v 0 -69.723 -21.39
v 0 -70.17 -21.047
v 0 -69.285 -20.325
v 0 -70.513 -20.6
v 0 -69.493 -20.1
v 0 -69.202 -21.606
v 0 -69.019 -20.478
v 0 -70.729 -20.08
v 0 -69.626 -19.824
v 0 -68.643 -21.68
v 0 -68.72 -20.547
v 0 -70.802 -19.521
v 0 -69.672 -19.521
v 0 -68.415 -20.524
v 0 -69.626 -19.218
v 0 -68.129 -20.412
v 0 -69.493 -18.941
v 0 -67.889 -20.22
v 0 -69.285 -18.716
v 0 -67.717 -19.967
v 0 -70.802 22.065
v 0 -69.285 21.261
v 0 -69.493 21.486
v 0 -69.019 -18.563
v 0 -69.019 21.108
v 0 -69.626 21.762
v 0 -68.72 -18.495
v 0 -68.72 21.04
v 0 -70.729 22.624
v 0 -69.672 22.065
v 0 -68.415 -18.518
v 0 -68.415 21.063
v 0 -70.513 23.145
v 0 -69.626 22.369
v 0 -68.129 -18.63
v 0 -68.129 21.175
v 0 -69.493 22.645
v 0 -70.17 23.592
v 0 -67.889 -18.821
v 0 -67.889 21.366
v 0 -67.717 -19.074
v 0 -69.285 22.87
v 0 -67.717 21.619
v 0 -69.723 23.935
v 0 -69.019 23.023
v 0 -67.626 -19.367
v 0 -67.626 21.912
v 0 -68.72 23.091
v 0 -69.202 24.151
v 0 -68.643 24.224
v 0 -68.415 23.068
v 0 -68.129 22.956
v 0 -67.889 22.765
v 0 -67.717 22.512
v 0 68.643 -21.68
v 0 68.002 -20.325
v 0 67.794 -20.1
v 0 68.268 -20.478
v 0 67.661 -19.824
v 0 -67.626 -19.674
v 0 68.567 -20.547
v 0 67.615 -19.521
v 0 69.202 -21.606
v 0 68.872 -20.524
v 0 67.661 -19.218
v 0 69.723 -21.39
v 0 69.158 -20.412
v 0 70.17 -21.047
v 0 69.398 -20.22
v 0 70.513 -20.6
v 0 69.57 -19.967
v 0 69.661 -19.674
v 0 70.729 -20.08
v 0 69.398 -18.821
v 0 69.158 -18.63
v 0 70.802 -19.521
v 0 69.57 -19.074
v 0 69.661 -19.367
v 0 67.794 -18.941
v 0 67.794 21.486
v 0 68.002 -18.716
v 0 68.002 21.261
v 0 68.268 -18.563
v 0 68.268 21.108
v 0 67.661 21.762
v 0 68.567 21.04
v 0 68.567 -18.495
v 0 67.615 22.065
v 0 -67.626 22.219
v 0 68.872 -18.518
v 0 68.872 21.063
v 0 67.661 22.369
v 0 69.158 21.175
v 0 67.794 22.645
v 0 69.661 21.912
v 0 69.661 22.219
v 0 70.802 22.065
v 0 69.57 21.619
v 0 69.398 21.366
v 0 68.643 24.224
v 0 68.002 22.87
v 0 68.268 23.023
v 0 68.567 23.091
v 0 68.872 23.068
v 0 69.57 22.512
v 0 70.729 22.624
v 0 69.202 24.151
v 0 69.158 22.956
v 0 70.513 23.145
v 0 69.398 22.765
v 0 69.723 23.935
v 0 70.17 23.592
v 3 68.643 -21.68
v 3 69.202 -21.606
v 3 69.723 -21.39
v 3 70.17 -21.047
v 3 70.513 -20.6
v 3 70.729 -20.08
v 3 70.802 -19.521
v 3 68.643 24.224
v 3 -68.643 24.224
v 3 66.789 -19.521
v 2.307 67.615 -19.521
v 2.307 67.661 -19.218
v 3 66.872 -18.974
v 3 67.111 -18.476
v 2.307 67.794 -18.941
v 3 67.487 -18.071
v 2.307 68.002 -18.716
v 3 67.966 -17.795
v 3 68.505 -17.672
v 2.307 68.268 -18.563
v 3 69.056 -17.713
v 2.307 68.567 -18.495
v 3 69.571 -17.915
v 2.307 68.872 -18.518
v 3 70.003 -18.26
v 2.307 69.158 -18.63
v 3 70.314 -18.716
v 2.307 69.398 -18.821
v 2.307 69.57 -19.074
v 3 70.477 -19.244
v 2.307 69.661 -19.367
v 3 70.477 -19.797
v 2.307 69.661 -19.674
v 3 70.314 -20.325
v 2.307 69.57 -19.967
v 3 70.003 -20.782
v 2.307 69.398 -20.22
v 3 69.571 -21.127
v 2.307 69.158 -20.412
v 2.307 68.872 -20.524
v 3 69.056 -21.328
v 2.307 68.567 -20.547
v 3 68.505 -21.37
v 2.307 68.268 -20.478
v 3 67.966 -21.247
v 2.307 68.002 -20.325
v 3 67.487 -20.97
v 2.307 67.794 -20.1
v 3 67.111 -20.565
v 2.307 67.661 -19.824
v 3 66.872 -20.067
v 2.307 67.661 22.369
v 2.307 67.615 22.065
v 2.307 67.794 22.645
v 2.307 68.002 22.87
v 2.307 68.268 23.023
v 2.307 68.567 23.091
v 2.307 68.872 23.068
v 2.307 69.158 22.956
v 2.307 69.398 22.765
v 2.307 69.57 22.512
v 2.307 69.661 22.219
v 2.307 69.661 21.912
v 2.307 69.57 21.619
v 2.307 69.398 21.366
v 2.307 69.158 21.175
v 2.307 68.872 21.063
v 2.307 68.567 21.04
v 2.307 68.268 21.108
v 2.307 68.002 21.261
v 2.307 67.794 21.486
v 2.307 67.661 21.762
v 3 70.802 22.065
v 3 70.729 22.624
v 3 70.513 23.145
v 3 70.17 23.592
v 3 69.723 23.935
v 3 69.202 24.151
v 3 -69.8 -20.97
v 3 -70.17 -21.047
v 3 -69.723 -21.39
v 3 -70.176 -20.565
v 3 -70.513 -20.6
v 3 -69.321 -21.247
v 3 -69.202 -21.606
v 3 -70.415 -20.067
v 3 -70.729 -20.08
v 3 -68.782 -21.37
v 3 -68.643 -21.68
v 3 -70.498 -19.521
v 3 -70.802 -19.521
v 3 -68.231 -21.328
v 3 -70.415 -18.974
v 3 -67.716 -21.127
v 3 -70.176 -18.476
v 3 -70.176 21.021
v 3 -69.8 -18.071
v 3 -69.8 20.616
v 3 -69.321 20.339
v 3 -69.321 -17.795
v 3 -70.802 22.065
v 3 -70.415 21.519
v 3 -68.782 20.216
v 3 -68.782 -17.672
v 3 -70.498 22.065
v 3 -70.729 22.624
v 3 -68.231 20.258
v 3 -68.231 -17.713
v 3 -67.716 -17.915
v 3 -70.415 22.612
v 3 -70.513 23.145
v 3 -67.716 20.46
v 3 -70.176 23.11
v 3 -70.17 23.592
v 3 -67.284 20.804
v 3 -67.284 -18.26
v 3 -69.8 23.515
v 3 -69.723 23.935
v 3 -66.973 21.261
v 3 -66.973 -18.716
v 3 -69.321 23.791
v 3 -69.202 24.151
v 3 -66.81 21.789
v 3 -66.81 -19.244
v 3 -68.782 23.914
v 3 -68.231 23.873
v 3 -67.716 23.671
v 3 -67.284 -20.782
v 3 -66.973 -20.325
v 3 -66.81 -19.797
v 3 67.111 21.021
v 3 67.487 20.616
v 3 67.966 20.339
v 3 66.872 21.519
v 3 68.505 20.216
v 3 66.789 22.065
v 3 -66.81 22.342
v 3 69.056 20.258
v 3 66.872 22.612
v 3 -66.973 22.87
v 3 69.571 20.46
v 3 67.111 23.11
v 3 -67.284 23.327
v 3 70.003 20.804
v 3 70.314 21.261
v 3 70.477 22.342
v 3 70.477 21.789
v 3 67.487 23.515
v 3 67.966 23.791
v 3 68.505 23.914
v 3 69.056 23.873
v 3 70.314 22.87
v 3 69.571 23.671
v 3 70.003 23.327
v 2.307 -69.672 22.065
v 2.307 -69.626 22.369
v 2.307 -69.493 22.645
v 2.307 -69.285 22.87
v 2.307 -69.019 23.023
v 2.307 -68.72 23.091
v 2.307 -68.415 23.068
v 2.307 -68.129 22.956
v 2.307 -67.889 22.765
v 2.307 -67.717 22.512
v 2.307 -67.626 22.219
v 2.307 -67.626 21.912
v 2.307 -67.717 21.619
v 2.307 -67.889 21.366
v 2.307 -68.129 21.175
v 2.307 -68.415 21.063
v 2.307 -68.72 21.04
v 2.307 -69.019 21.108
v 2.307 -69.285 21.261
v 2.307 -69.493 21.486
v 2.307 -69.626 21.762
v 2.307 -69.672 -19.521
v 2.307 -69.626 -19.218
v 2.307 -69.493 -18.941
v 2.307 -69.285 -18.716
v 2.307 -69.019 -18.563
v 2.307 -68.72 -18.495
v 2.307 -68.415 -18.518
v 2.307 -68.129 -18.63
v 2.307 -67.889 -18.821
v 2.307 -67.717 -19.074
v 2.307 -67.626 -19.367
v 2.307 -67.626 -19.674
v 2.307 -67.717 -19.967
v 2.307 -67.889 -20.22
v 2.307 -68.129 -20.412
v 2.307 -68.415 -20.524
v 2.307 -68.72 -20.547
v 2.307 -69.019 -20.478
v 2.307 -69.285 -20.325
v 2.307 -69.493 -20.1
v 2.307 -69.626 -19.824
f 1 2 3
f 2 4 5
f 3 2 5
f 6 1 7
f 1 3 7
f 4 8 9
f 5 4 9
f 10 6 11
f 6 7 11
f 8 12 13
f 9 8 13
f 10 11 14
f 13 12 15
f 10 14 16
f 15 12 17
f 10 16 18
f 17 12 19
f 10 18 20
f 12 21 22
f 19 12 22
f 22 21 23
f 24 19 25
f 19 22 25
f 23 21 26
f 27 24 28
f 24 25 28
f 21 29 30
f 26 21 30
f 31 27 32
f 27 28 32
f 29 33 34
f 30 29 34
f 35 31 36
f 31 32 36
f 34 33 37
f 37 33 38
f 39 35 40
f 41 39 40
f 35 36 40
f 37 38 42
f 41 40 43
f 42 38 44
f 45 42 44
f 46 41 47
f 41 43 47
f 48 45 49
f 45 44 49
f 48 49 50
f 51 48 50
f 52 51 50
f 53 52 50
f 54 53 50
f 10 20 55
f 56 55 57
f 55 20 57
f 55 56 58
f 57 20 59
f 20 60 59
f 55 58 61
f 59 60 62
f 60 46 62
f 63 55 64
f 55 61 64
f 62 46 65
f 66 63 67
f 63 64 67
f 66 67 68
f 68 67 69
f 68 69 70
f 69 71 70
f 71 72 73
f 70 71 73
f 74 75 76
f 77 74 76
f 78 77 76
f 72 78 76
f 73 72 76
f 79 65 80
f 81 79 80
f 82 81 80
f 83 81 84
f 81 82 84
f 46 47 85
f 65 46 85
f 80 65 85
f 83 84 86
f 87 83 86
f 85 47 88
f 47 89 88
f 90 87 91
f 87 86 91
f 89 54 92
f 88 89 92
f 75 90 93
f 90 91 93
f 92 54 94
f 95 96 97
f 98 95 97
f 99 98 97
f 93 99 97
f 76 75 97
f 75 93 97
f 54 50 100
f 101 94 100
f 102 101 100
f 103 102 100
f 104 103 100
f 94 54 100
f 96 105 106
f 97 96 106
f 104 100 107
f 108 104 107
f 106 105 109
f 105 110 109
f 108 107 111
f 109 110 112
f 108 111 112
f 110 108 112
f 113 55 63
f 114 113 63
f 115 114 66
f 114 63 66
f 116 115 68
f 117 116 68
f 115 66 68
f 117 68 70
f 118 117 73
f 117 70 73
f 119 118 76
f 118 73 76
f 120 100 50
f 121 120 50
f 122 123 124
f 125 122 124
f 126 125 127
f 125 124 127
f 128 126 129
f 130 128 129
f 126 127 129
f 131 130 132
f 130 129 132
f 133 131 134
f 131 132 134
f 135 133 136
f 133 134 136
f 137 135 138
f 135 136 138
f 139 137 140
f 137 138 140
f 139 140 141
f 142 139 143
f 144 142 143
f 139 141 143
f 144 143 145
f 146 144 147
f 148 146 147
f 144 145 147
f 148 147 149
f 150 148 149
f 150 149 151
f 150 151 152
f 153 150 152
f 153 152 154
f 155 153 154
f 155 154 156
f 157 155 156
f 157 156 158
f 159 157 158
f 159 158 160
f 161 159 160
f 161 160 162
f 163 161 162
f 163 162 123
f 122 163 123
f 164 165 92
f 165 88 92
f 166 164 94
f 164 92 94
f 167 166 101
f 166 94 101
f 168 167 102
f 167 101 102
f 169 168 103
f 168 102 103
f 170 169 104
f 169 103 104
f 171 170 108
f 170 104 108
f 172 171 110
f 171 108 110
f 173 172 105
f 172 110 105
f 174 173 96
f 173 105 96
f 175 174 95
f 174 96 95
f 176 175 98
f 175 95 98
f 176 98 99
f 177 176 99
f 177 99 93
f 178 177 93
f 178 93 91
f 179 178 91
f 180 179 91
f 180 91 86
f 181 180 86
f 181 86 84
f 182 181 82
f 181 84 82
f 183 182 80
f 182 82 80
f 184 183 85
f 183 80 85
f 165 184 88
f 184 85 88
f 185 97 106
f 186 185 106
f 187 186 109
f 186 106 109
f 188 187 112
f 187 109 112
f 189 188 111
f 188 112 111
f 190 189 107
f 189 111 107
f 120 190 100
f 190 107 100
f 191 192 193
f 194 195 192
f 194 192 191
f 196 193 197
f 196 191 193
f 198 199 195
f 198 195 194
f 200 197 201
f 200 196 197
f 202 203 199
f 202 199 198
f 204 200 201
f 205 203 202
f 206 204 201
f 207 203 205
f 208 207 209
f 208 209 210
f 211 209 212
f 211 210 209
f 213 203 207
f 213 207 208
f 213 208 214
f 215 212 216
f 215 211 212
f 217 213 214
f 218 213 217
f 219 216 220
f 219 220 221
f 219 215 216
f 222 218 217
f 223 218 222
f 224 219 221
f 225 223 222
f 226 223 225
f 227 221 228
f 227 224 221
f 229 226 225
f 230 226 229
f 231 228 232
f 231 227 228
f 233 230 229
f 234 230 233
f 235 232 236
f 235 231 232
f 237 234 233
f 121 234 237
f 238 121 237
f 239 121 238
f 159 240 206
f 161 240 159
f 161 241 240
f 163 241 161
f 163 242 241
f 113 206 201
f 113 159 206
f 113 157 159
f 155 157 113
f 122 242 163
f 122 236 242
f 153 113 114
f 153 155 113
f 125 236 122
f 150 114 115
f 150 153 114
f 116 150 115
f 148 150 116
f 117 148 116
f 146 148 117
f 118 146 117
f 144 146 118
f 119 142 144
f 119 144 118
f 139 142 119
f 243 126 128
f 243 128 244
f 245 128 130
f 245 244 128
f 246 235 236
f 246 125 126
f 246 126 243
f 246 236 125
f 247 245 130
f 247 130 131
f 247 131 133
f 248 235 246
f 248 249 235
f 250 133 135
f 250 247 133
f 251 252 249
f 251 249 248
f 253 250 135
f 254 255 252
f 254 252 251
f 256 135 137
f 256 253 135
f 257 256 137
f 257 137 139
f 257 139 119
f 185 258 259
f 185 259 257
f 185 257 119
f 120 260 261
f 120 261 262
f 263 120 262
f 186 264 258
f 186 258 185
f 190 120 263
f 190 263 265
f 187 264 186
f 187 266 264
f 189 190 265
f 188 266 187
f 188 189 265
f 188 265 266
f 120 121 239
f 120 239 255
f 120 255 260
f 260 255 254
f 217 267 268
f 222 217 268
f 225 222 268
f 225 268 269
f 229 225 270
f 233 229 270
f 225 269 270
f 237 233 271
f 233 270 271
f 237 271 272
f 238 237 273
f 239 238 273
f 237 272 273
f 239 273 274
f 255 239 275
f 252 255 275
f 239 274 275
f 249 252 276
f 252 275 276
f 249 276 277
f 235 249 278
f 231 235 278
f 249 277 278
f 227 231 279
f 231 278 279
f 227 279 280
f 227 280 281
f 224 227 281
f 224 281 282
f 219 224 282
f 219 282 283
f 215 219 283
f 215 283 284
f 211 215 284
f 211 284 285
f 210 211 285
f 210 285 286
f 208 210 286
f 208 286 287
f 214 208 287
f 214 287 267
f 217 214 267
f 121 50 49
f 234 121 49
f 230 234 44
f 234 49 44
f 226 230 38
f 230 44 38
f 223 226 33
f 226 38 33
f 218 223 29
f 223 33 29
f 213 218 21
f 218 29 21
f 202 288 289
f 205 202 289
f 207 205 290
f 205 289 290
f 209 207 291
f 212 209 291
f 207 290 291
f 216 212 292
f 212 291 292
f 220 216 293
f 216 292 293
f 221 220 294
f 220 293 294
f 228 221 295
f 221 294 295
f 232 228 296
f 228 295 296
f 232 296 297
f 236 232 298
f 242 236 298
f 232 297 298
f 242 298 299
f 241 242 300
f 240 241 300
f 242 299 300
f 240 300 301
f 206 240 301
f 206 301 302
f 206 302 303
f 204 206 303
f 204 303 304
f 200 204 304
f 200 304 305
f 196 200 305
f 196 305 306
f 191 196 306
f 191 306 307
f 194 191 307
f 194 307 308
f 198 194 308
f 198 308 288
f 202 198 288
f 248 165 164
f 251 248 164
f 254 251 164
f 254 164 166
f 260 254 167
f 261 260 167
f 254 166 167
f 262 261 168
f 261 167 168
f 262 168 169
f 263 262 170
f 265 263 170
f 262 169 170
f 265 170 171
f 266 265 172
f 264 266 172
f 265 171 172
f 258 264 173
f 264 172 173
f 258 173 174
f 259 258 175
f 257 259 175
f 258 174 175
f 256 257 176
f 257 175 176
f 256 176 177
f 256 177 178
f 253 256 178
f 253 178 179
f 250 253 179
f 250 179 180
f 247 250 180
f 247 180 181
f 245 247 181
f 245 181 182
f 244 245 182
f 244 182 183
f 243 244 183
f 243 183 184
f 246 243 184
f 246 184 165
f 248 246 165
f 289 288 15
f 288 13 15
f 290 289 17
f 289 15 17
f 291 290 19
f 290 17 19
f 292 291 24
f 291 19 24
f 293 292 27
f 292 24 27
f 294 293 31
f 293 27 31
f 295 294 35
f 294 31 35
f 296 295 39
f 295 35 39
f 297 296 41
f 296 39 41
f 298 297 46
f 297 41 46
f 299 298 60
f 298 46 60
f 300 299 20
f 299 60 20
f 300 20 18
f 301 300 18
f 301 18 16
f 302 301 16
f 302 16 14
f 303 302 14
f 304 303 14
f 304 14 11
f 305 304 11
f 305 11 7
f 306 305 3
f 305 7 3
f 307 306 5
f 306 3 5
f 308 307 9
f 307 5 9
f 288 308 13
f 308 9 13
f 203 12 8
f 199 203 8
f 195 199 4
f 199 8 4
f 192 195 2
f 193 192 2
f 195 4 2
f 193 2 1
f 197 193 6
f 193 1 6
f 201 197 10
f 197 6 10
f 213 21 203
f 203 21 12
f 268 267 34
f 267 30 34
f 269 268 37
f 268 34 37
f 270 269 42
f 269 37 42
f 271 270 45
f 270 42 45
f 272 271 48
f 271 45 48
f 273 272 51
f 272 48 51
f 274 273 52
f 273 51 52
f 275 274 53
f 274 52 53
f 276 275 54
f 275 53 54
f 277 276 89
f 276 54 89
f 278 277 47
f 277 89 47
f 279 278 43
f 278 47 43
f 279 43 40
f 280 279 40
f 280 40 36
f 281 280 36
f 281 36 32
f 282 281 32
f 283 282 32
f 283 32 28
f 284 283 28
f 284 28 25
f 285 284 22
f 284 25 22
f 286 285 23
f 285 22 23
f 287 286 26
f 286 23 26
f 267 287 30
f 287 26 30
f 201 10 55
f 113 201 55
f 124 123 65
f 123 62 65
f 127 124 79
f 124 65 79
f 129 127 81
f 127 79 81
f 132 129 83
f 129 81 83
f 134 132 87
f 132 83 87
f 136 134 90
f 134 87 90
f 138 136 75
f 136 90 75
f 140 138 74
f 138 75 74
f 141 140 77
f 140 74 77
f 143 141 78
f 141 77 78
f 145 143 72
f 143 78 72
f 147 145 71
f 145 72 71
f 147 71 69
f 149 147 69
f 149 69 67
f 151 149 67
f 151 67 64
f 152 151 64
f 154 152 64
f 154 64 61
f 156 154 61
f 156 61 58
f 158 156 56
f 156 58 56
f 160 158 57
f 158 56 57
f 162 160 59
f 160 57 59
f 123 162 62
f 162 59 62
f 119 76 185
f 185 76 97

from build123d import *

# Parameters (mm, degrees)
BOSS_EXTRUDE1_DEPTH                               = 3
CSK_FOR_1_FLAT_HEAD_MACHINE_SCREW_100_D           = 2.0574
CSK_FOR_1_FLAT_HEAD_MACHINE_SCREW_100_CSINK_D     = 3.7084
CSK_FOR_1_FLAT_HEAD_MACHINE_SCREW_100_CSINK_ANGLE = 100


with BuildPart() as part:
    # Sketch1 → Boss-Extrude1 (new body)
    with BuildSketch(Plane.YZ):
        with BuildLine():
            Line((-70.802499273, 22.065445977), (-70.802499273, -19.520741015))
            ThreePointArc((-70.802499273, -19.520741015), (-70.170142814, -21.047384555), (-68.643499273, -21.679741015))
            Line((-68.643499273, -21.679741015), (68.643499273, -21.679741015))
            ThreePointArc((68.643499273, -21.679741015), (70.170142814, -21.047384555), (70.802499273, -19.520741015))
            Line((70.802499273, -19.520741015), (70.802499273, 22.065445977))
            ThreePointArc((70.802499273, 22.065445977), (70.170142814, 23.592089518), (68.643499273, 24.224445977))
            Line((68.643499273, 24.224445977), (-68.643499273, 24.224445977))
            ThreePointArc((-68.643499273, 24.224445977), (-70.170142814, 23.592089518), (-70.802499273, 22.065445977))
        make_face()
    extrude(amount=BOSS_EXTRUDE1_DEPTH)

    # CSK for #1 Flat Head Machine Screw (100)1 (through all)
    with Locations(Plane.YZ.offset(3)):
        with Locations((68.643499273, 22.065445977), (68.643499273, -19.520741015), (-68.643499273, -19.520741015), (-68.643499273, 22.065445977)):
            CounterSinkHole(CSK_FOR_1_FLAT_HEAD_MACHINE_SCREW_100_D / 2, CSK_FOR_1_FLAT_HEAD_MACHINE_SCREW_100_CSINK_D / 2, counter_sink_angle=CSK_FOR_1_FLAT_HEAD_MACHINE_SCREW_100_CSINK_ANGLE)


solid = part.part
